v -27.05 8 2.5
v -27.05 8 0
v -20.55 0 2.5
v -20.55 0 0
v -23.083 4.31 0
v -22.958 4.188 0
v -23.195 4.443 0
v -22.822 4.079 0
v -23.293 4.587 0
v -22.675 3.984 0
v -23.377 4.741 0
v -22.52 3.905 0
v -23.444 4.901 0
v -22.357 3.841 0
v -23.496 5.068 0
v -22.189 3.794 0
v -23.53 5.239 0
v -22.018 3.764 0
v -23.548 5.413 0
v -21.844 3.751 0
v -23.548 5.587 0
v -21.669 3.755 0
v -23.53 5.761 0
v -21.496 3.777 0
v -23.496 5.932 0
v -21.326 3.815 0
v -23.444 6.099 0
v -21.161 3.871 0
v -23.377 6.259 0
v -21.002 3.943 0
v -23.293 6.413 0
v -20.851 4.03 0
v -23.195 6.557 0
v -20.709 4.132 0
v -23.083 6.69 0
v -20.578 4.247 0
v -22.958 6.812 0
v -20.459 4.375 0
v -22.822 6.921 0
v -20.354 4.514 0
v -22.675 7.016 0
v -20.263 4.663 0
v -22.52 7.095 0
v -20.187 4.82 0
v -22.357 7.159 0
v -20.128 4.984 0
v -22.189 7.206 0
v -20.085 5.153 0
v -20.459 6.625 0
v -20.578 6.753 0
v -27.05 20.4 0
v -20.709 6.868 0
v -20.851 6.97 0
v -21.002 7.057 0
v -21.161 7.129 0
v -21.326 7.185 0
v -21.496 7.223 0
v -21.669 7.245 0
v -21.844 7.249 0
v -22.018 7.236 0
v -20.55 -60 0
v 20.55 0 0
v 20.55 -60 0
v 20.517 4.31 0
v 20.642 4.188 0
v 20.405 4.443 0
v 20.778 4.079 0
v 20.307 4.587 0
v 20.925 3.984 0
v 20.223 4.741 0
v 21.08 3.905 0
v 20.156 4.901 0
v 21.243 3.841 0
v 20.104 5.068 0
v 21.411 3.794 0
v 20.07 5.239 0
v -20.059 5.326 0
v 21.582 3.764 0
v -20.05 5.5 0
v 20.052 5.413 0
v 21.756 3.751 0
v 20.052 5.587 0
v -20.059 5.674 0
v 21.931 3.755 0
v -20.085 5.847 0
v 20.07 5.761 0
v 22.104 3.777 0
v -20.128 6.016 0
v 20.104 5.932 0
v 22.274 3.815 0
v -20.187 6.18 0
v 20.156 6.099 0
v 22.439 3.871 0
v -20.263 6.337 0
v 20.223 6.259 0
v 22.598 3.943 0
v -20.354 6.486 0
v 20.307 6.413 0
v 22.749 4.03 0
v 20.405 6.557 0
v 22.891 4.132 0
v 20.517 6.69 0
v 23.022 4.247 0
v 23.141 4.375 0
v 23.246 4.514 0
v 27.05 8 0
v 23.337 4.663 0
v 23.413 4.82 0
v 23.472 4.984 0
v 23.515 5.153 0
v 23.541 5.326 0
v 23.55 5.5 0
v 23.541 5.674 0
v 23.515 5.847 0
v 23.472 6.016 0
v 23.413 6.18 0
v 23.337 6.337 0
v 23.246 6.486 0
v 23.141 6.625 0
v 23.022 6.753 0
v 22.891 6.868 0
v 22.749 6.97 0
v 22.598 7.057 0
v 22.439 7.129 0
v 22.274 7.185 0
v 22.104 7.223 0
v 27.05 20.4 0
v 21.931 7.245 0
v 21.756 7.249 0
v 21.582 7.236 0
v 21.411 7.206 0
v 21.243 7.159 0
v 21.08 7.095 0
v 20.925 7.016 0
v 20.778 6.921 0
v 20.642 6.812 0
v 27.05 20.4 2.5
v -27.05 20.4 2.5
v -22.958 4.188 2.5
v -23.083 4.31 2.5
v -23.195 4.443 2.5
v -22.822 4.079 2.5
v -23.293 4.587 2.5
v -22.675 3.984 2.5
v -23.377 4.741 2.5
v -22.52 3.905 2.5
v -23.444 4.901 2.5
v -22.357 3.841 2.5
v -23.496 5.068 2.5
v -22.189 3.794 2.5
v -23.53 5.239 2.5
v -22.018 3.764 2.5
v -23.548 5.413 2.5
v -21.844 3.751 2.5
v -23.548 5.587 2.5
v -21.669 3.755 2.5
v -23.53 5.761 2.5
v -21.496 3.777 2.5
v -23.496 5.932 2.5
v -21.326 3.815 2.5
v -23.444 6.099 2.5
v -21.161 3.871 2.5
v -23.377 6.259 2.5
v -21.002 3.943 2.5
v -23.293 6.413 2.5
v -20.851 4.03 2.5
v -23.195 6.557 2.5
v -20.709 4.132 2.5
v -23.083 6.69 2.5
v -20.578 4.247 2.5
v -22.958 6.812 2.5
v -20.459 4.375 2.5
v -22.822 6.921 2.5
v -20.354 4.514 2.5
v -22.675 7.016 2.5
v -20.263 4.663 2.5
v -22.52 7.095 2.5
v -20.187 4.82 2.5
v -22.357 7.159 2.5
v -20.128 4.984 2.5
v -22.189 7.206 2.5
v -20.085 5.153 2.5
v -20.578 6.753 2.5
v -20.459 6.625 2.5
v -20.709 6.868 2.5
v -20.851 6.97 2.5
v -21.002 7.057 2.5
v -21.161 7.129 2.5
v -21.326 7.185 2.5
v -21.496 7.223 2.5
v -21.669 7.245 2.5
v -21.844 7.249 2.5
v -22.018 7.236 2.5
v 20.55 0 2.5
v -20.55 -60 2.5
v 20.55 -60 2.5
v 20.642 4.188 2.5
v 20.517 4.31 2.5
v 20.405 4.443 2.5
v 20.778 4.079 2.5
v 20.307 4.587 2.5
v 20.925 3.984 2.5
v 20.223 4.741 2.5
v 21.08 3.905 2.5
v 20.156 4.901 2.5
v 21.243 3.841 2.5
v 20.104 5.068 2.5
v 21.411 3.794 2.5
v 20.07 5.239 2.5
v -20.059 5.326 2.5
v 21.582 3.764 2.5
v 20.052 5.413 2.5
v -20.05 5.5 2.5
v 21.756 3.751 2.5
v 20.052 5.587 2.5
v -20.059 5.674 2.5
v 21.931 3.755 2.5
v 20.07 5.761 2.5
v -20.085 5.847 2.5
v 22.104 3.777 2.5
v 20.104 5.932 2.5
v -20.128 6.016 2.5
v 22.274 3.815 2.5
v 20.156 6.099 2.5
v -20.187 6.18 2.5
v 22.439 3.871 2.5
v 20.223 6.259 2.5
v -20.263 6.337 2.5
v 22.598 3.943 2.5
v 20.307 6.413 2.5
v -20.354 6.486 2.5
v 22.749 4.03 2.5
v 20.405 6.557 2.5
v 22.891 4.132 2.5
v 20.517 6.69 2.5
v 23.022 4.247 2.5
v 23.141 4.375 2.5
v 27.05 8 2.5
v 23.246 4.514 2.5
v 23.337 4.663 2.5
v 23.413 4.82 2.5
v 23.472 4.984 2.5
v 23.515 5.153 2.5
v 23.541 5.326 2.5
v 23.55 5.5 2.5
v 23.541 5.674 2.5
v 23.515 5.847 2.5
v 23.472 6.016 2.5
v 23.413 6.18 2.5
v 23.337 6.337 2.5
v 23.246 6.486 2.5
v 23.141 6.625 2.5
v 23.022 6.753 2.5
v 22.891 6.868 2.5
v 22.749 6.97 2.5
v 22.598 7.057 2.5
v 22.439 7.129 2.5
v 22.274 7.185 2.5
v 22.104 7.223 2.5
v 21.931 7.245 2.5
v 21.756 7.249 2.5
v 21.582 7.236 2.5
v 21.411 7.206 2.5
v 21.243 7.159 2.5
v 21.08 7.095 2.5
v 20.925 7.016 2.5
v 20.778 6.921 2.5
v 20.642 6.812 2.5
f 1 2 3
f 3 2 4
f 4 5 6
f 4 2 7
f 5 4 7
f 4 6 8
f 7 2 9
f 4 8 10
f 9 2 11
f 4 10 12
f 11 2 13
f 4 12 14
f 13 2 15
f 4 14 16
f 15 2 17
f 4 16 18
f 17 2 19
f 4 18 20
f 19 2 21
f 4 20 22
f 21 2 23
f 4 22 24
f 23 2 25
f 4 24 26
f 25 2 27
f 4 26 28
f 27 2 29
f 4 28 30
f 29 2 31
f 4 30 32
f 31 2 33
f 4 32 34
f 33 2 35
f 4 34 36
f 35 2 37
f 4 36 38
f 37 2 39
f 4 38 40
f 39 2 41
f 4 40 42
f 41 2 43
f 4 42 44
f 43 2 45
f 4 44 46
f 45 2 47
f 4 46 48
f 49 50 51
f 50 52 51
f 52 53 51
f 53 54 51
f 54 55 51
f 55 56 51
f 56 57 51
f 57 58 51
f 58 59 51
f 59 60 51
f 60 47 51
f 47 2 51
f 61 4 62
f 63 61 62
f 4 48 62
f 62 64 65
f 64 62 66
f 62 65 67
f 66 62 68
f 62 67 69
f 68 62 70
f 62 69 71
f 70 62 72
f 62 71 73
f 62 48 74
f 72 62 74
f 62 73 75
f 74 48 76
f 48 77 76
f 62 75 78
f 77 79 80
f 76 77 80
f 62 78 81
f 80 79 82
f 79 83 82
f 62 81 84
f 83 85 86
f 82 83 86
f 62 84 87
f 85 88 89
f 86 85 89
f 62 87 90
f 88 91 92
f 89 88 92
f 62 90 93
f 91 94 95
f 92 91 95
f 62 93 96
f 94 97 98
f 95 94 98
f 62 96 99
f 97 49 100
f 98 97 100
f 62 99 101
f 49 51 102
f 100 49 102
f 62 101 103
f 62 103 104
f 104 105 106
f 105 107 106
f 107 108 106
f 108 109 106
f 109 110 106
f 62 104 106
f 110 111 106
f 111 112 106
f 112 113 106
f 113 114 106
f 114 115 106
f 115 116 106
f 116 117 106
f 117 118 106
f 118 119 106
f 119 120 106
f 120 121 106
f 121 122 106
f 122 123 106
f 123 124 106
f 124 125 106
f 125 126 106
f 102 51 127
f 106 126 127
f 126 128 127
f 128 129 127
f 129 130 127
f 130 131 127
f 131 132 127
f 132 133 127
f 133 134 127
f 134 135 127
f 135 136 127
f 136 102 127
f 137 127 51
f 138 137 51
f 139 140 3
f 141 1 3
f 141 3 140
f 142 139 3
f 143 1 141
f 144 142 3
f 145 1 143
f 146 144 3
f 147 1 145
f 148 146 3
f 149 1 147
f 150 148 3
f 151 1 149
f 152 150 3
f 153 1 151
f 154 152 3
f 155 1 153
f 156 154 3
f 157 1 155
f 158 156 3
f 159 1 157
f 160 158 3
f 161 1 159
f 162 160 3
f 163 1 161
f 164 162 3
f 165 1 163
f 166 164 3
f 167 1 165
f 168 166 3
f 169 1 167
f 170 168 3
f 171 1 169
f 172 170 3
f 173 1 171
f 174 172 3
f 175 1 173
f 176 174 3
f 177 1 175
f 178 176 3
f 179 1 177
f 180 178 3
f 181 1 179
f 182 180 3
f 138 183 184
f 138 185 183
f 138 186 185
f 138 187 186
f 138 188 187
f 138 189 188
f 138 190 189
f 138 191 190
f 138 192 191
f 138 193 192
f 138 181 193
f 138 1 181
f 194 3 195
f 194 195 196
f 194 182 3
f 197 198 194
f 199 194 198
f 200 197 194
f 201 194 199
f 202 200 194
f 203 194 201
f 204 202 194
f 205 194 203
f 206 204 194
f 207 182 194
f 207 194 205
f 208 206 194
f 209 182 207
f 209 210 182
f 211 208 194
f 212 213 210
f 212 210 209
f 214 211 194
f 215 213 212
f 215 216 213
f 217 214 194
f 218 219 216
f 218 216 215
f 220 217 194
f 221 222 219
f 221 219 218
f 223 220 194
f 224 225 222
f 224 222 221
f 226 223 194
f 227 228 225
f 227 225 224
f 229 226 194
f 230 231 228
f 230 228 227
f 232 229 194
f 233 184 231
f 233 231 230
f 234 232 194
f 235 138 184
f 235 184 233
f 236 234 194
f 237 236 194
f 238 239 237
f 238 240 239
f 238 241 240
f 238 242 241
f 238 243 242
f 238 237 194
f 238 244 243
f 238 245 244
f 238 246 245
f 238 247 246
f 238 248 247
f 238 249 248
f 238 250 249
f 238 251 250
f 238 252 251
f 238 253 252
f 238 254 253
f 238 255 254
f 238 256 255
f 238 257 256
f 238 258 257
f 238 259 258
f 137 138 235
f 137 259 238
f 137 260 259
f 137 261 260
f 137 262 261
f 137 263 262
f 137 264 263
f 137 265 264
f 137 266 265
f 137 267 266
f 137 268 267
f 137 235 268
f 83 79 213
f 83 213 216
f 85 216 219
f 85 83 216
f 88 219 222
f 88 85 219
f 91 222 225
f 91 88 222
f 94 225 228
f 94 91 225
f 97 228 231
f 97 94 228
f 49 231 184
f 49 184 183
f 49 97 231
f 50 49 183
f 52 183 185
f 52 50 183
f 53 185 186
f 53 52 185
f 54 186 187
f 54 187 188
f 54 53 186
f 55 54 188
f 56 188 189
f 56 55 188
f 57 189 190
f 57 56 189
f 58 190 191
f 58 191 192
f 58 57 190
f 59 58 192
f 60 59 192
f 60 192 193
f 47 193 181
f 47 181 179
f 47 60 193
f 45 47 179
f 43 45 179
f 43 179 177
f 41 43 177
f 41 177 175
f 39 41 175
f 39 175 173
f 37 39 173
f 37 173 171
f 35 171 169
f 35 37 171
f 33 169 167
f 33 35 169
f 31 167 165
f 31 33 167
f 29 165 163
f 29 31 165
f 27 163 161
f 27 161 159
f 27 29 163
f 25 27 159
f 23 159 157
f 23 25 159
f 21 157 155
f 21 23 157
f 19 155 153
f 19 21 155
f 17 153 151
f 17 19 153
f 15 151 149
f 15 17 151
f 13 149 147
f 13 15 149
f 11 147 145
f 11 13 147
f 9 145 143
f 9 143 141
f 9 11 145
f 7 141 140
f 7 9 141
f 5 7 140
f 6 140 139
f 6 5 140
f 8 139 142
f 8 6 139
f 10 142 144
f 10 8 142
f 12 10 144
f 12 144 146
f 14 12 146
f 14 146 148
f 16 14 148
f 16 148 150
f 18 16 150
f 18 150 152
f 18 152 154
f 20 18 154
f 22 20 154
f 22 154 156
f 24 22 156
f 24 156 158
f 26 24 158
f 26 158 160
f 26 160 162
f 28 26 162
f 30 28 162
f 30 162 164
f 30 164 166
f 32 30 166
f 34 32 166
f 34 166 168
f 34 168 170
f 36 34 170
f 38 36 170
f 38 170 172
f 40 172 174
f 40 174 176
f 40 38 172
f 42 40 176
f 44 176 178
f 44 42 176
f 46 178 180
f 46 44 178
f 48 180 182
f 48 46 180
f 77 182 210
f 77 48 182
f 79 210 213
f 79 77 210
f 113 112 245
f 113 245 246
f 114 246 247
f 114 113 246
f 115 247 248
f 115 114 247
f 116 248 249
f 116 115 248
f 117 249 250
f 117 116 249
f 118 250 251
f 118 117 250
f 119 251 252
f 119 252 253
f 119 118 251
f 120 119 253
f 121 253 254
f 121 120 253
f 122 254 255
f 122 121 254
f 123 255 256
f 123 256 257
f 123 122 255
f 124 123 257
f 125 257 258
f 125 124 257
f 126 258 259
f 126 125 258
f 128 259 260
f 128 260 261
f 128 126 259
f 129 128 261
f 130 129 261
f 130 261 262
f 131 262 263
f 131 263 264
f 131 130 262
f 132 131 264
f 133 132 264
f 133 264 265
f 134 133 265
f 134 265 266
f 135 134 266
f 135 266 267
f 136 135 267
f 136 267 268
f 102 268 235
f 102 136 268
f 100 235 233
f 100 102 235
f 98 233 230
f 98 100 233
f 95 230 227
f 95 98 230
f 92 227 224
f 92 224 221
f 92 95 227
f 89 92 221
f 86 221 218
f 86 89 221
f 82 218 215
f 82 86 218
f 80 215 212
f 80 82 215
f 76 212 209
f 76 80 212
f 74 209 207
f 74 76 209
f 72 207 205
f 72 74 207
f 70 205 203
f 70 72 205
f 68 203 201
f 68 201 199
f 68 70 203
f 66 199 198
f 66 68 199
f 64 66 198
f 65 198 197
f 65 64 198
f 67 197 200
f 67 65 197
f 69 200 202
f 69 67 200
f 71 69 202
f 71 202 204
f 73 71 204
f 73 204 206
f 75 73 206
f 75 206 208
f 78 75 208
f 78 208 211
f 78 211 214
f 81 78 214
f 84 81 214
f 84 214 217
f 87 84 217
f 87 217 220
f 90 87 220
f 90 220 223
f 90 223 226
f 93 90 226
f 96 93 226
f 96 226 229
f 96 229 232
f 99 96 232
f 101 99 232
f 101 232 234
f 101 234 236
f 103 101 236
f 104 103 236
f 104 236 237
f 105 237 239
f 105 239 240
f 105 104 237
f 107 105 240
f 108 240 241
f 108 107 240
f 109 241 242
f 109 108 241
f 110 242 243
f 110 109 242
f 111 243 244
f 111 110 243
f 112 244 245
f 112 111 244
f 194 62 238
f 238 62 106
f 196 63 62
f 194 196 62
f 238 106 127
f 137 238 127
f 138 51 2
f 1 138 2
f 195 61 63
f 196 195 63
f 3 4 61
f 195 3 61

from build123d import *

# Parameters (mm, degrees)
F0_R     = 1.75
F1_DEPTH = 2.5


with BuildPart() as f1:
    # F0 (on Top) → F1 (new body)
    with BuildSketch(Plane.XY):
        Polygon((-27.05, 8), (-20.55, 0), (-20.55, -60), (0, -60), (20.55, -60), (20.55, 0), (27.05, 8), (27.05, 20.4), (0, 20.4), (-27.05, 20.4), align=None)
        with Locations((-21.8, 5.5)):
            Circle(F0_R, mode=Mode.SUBTRACT)
        with Locations((21.8, 5.5)):
            Circle(F0_R, mode=Mode.SUBTRACT)
    extrude(amount=F1_DEPTH)


solid = f1.part
